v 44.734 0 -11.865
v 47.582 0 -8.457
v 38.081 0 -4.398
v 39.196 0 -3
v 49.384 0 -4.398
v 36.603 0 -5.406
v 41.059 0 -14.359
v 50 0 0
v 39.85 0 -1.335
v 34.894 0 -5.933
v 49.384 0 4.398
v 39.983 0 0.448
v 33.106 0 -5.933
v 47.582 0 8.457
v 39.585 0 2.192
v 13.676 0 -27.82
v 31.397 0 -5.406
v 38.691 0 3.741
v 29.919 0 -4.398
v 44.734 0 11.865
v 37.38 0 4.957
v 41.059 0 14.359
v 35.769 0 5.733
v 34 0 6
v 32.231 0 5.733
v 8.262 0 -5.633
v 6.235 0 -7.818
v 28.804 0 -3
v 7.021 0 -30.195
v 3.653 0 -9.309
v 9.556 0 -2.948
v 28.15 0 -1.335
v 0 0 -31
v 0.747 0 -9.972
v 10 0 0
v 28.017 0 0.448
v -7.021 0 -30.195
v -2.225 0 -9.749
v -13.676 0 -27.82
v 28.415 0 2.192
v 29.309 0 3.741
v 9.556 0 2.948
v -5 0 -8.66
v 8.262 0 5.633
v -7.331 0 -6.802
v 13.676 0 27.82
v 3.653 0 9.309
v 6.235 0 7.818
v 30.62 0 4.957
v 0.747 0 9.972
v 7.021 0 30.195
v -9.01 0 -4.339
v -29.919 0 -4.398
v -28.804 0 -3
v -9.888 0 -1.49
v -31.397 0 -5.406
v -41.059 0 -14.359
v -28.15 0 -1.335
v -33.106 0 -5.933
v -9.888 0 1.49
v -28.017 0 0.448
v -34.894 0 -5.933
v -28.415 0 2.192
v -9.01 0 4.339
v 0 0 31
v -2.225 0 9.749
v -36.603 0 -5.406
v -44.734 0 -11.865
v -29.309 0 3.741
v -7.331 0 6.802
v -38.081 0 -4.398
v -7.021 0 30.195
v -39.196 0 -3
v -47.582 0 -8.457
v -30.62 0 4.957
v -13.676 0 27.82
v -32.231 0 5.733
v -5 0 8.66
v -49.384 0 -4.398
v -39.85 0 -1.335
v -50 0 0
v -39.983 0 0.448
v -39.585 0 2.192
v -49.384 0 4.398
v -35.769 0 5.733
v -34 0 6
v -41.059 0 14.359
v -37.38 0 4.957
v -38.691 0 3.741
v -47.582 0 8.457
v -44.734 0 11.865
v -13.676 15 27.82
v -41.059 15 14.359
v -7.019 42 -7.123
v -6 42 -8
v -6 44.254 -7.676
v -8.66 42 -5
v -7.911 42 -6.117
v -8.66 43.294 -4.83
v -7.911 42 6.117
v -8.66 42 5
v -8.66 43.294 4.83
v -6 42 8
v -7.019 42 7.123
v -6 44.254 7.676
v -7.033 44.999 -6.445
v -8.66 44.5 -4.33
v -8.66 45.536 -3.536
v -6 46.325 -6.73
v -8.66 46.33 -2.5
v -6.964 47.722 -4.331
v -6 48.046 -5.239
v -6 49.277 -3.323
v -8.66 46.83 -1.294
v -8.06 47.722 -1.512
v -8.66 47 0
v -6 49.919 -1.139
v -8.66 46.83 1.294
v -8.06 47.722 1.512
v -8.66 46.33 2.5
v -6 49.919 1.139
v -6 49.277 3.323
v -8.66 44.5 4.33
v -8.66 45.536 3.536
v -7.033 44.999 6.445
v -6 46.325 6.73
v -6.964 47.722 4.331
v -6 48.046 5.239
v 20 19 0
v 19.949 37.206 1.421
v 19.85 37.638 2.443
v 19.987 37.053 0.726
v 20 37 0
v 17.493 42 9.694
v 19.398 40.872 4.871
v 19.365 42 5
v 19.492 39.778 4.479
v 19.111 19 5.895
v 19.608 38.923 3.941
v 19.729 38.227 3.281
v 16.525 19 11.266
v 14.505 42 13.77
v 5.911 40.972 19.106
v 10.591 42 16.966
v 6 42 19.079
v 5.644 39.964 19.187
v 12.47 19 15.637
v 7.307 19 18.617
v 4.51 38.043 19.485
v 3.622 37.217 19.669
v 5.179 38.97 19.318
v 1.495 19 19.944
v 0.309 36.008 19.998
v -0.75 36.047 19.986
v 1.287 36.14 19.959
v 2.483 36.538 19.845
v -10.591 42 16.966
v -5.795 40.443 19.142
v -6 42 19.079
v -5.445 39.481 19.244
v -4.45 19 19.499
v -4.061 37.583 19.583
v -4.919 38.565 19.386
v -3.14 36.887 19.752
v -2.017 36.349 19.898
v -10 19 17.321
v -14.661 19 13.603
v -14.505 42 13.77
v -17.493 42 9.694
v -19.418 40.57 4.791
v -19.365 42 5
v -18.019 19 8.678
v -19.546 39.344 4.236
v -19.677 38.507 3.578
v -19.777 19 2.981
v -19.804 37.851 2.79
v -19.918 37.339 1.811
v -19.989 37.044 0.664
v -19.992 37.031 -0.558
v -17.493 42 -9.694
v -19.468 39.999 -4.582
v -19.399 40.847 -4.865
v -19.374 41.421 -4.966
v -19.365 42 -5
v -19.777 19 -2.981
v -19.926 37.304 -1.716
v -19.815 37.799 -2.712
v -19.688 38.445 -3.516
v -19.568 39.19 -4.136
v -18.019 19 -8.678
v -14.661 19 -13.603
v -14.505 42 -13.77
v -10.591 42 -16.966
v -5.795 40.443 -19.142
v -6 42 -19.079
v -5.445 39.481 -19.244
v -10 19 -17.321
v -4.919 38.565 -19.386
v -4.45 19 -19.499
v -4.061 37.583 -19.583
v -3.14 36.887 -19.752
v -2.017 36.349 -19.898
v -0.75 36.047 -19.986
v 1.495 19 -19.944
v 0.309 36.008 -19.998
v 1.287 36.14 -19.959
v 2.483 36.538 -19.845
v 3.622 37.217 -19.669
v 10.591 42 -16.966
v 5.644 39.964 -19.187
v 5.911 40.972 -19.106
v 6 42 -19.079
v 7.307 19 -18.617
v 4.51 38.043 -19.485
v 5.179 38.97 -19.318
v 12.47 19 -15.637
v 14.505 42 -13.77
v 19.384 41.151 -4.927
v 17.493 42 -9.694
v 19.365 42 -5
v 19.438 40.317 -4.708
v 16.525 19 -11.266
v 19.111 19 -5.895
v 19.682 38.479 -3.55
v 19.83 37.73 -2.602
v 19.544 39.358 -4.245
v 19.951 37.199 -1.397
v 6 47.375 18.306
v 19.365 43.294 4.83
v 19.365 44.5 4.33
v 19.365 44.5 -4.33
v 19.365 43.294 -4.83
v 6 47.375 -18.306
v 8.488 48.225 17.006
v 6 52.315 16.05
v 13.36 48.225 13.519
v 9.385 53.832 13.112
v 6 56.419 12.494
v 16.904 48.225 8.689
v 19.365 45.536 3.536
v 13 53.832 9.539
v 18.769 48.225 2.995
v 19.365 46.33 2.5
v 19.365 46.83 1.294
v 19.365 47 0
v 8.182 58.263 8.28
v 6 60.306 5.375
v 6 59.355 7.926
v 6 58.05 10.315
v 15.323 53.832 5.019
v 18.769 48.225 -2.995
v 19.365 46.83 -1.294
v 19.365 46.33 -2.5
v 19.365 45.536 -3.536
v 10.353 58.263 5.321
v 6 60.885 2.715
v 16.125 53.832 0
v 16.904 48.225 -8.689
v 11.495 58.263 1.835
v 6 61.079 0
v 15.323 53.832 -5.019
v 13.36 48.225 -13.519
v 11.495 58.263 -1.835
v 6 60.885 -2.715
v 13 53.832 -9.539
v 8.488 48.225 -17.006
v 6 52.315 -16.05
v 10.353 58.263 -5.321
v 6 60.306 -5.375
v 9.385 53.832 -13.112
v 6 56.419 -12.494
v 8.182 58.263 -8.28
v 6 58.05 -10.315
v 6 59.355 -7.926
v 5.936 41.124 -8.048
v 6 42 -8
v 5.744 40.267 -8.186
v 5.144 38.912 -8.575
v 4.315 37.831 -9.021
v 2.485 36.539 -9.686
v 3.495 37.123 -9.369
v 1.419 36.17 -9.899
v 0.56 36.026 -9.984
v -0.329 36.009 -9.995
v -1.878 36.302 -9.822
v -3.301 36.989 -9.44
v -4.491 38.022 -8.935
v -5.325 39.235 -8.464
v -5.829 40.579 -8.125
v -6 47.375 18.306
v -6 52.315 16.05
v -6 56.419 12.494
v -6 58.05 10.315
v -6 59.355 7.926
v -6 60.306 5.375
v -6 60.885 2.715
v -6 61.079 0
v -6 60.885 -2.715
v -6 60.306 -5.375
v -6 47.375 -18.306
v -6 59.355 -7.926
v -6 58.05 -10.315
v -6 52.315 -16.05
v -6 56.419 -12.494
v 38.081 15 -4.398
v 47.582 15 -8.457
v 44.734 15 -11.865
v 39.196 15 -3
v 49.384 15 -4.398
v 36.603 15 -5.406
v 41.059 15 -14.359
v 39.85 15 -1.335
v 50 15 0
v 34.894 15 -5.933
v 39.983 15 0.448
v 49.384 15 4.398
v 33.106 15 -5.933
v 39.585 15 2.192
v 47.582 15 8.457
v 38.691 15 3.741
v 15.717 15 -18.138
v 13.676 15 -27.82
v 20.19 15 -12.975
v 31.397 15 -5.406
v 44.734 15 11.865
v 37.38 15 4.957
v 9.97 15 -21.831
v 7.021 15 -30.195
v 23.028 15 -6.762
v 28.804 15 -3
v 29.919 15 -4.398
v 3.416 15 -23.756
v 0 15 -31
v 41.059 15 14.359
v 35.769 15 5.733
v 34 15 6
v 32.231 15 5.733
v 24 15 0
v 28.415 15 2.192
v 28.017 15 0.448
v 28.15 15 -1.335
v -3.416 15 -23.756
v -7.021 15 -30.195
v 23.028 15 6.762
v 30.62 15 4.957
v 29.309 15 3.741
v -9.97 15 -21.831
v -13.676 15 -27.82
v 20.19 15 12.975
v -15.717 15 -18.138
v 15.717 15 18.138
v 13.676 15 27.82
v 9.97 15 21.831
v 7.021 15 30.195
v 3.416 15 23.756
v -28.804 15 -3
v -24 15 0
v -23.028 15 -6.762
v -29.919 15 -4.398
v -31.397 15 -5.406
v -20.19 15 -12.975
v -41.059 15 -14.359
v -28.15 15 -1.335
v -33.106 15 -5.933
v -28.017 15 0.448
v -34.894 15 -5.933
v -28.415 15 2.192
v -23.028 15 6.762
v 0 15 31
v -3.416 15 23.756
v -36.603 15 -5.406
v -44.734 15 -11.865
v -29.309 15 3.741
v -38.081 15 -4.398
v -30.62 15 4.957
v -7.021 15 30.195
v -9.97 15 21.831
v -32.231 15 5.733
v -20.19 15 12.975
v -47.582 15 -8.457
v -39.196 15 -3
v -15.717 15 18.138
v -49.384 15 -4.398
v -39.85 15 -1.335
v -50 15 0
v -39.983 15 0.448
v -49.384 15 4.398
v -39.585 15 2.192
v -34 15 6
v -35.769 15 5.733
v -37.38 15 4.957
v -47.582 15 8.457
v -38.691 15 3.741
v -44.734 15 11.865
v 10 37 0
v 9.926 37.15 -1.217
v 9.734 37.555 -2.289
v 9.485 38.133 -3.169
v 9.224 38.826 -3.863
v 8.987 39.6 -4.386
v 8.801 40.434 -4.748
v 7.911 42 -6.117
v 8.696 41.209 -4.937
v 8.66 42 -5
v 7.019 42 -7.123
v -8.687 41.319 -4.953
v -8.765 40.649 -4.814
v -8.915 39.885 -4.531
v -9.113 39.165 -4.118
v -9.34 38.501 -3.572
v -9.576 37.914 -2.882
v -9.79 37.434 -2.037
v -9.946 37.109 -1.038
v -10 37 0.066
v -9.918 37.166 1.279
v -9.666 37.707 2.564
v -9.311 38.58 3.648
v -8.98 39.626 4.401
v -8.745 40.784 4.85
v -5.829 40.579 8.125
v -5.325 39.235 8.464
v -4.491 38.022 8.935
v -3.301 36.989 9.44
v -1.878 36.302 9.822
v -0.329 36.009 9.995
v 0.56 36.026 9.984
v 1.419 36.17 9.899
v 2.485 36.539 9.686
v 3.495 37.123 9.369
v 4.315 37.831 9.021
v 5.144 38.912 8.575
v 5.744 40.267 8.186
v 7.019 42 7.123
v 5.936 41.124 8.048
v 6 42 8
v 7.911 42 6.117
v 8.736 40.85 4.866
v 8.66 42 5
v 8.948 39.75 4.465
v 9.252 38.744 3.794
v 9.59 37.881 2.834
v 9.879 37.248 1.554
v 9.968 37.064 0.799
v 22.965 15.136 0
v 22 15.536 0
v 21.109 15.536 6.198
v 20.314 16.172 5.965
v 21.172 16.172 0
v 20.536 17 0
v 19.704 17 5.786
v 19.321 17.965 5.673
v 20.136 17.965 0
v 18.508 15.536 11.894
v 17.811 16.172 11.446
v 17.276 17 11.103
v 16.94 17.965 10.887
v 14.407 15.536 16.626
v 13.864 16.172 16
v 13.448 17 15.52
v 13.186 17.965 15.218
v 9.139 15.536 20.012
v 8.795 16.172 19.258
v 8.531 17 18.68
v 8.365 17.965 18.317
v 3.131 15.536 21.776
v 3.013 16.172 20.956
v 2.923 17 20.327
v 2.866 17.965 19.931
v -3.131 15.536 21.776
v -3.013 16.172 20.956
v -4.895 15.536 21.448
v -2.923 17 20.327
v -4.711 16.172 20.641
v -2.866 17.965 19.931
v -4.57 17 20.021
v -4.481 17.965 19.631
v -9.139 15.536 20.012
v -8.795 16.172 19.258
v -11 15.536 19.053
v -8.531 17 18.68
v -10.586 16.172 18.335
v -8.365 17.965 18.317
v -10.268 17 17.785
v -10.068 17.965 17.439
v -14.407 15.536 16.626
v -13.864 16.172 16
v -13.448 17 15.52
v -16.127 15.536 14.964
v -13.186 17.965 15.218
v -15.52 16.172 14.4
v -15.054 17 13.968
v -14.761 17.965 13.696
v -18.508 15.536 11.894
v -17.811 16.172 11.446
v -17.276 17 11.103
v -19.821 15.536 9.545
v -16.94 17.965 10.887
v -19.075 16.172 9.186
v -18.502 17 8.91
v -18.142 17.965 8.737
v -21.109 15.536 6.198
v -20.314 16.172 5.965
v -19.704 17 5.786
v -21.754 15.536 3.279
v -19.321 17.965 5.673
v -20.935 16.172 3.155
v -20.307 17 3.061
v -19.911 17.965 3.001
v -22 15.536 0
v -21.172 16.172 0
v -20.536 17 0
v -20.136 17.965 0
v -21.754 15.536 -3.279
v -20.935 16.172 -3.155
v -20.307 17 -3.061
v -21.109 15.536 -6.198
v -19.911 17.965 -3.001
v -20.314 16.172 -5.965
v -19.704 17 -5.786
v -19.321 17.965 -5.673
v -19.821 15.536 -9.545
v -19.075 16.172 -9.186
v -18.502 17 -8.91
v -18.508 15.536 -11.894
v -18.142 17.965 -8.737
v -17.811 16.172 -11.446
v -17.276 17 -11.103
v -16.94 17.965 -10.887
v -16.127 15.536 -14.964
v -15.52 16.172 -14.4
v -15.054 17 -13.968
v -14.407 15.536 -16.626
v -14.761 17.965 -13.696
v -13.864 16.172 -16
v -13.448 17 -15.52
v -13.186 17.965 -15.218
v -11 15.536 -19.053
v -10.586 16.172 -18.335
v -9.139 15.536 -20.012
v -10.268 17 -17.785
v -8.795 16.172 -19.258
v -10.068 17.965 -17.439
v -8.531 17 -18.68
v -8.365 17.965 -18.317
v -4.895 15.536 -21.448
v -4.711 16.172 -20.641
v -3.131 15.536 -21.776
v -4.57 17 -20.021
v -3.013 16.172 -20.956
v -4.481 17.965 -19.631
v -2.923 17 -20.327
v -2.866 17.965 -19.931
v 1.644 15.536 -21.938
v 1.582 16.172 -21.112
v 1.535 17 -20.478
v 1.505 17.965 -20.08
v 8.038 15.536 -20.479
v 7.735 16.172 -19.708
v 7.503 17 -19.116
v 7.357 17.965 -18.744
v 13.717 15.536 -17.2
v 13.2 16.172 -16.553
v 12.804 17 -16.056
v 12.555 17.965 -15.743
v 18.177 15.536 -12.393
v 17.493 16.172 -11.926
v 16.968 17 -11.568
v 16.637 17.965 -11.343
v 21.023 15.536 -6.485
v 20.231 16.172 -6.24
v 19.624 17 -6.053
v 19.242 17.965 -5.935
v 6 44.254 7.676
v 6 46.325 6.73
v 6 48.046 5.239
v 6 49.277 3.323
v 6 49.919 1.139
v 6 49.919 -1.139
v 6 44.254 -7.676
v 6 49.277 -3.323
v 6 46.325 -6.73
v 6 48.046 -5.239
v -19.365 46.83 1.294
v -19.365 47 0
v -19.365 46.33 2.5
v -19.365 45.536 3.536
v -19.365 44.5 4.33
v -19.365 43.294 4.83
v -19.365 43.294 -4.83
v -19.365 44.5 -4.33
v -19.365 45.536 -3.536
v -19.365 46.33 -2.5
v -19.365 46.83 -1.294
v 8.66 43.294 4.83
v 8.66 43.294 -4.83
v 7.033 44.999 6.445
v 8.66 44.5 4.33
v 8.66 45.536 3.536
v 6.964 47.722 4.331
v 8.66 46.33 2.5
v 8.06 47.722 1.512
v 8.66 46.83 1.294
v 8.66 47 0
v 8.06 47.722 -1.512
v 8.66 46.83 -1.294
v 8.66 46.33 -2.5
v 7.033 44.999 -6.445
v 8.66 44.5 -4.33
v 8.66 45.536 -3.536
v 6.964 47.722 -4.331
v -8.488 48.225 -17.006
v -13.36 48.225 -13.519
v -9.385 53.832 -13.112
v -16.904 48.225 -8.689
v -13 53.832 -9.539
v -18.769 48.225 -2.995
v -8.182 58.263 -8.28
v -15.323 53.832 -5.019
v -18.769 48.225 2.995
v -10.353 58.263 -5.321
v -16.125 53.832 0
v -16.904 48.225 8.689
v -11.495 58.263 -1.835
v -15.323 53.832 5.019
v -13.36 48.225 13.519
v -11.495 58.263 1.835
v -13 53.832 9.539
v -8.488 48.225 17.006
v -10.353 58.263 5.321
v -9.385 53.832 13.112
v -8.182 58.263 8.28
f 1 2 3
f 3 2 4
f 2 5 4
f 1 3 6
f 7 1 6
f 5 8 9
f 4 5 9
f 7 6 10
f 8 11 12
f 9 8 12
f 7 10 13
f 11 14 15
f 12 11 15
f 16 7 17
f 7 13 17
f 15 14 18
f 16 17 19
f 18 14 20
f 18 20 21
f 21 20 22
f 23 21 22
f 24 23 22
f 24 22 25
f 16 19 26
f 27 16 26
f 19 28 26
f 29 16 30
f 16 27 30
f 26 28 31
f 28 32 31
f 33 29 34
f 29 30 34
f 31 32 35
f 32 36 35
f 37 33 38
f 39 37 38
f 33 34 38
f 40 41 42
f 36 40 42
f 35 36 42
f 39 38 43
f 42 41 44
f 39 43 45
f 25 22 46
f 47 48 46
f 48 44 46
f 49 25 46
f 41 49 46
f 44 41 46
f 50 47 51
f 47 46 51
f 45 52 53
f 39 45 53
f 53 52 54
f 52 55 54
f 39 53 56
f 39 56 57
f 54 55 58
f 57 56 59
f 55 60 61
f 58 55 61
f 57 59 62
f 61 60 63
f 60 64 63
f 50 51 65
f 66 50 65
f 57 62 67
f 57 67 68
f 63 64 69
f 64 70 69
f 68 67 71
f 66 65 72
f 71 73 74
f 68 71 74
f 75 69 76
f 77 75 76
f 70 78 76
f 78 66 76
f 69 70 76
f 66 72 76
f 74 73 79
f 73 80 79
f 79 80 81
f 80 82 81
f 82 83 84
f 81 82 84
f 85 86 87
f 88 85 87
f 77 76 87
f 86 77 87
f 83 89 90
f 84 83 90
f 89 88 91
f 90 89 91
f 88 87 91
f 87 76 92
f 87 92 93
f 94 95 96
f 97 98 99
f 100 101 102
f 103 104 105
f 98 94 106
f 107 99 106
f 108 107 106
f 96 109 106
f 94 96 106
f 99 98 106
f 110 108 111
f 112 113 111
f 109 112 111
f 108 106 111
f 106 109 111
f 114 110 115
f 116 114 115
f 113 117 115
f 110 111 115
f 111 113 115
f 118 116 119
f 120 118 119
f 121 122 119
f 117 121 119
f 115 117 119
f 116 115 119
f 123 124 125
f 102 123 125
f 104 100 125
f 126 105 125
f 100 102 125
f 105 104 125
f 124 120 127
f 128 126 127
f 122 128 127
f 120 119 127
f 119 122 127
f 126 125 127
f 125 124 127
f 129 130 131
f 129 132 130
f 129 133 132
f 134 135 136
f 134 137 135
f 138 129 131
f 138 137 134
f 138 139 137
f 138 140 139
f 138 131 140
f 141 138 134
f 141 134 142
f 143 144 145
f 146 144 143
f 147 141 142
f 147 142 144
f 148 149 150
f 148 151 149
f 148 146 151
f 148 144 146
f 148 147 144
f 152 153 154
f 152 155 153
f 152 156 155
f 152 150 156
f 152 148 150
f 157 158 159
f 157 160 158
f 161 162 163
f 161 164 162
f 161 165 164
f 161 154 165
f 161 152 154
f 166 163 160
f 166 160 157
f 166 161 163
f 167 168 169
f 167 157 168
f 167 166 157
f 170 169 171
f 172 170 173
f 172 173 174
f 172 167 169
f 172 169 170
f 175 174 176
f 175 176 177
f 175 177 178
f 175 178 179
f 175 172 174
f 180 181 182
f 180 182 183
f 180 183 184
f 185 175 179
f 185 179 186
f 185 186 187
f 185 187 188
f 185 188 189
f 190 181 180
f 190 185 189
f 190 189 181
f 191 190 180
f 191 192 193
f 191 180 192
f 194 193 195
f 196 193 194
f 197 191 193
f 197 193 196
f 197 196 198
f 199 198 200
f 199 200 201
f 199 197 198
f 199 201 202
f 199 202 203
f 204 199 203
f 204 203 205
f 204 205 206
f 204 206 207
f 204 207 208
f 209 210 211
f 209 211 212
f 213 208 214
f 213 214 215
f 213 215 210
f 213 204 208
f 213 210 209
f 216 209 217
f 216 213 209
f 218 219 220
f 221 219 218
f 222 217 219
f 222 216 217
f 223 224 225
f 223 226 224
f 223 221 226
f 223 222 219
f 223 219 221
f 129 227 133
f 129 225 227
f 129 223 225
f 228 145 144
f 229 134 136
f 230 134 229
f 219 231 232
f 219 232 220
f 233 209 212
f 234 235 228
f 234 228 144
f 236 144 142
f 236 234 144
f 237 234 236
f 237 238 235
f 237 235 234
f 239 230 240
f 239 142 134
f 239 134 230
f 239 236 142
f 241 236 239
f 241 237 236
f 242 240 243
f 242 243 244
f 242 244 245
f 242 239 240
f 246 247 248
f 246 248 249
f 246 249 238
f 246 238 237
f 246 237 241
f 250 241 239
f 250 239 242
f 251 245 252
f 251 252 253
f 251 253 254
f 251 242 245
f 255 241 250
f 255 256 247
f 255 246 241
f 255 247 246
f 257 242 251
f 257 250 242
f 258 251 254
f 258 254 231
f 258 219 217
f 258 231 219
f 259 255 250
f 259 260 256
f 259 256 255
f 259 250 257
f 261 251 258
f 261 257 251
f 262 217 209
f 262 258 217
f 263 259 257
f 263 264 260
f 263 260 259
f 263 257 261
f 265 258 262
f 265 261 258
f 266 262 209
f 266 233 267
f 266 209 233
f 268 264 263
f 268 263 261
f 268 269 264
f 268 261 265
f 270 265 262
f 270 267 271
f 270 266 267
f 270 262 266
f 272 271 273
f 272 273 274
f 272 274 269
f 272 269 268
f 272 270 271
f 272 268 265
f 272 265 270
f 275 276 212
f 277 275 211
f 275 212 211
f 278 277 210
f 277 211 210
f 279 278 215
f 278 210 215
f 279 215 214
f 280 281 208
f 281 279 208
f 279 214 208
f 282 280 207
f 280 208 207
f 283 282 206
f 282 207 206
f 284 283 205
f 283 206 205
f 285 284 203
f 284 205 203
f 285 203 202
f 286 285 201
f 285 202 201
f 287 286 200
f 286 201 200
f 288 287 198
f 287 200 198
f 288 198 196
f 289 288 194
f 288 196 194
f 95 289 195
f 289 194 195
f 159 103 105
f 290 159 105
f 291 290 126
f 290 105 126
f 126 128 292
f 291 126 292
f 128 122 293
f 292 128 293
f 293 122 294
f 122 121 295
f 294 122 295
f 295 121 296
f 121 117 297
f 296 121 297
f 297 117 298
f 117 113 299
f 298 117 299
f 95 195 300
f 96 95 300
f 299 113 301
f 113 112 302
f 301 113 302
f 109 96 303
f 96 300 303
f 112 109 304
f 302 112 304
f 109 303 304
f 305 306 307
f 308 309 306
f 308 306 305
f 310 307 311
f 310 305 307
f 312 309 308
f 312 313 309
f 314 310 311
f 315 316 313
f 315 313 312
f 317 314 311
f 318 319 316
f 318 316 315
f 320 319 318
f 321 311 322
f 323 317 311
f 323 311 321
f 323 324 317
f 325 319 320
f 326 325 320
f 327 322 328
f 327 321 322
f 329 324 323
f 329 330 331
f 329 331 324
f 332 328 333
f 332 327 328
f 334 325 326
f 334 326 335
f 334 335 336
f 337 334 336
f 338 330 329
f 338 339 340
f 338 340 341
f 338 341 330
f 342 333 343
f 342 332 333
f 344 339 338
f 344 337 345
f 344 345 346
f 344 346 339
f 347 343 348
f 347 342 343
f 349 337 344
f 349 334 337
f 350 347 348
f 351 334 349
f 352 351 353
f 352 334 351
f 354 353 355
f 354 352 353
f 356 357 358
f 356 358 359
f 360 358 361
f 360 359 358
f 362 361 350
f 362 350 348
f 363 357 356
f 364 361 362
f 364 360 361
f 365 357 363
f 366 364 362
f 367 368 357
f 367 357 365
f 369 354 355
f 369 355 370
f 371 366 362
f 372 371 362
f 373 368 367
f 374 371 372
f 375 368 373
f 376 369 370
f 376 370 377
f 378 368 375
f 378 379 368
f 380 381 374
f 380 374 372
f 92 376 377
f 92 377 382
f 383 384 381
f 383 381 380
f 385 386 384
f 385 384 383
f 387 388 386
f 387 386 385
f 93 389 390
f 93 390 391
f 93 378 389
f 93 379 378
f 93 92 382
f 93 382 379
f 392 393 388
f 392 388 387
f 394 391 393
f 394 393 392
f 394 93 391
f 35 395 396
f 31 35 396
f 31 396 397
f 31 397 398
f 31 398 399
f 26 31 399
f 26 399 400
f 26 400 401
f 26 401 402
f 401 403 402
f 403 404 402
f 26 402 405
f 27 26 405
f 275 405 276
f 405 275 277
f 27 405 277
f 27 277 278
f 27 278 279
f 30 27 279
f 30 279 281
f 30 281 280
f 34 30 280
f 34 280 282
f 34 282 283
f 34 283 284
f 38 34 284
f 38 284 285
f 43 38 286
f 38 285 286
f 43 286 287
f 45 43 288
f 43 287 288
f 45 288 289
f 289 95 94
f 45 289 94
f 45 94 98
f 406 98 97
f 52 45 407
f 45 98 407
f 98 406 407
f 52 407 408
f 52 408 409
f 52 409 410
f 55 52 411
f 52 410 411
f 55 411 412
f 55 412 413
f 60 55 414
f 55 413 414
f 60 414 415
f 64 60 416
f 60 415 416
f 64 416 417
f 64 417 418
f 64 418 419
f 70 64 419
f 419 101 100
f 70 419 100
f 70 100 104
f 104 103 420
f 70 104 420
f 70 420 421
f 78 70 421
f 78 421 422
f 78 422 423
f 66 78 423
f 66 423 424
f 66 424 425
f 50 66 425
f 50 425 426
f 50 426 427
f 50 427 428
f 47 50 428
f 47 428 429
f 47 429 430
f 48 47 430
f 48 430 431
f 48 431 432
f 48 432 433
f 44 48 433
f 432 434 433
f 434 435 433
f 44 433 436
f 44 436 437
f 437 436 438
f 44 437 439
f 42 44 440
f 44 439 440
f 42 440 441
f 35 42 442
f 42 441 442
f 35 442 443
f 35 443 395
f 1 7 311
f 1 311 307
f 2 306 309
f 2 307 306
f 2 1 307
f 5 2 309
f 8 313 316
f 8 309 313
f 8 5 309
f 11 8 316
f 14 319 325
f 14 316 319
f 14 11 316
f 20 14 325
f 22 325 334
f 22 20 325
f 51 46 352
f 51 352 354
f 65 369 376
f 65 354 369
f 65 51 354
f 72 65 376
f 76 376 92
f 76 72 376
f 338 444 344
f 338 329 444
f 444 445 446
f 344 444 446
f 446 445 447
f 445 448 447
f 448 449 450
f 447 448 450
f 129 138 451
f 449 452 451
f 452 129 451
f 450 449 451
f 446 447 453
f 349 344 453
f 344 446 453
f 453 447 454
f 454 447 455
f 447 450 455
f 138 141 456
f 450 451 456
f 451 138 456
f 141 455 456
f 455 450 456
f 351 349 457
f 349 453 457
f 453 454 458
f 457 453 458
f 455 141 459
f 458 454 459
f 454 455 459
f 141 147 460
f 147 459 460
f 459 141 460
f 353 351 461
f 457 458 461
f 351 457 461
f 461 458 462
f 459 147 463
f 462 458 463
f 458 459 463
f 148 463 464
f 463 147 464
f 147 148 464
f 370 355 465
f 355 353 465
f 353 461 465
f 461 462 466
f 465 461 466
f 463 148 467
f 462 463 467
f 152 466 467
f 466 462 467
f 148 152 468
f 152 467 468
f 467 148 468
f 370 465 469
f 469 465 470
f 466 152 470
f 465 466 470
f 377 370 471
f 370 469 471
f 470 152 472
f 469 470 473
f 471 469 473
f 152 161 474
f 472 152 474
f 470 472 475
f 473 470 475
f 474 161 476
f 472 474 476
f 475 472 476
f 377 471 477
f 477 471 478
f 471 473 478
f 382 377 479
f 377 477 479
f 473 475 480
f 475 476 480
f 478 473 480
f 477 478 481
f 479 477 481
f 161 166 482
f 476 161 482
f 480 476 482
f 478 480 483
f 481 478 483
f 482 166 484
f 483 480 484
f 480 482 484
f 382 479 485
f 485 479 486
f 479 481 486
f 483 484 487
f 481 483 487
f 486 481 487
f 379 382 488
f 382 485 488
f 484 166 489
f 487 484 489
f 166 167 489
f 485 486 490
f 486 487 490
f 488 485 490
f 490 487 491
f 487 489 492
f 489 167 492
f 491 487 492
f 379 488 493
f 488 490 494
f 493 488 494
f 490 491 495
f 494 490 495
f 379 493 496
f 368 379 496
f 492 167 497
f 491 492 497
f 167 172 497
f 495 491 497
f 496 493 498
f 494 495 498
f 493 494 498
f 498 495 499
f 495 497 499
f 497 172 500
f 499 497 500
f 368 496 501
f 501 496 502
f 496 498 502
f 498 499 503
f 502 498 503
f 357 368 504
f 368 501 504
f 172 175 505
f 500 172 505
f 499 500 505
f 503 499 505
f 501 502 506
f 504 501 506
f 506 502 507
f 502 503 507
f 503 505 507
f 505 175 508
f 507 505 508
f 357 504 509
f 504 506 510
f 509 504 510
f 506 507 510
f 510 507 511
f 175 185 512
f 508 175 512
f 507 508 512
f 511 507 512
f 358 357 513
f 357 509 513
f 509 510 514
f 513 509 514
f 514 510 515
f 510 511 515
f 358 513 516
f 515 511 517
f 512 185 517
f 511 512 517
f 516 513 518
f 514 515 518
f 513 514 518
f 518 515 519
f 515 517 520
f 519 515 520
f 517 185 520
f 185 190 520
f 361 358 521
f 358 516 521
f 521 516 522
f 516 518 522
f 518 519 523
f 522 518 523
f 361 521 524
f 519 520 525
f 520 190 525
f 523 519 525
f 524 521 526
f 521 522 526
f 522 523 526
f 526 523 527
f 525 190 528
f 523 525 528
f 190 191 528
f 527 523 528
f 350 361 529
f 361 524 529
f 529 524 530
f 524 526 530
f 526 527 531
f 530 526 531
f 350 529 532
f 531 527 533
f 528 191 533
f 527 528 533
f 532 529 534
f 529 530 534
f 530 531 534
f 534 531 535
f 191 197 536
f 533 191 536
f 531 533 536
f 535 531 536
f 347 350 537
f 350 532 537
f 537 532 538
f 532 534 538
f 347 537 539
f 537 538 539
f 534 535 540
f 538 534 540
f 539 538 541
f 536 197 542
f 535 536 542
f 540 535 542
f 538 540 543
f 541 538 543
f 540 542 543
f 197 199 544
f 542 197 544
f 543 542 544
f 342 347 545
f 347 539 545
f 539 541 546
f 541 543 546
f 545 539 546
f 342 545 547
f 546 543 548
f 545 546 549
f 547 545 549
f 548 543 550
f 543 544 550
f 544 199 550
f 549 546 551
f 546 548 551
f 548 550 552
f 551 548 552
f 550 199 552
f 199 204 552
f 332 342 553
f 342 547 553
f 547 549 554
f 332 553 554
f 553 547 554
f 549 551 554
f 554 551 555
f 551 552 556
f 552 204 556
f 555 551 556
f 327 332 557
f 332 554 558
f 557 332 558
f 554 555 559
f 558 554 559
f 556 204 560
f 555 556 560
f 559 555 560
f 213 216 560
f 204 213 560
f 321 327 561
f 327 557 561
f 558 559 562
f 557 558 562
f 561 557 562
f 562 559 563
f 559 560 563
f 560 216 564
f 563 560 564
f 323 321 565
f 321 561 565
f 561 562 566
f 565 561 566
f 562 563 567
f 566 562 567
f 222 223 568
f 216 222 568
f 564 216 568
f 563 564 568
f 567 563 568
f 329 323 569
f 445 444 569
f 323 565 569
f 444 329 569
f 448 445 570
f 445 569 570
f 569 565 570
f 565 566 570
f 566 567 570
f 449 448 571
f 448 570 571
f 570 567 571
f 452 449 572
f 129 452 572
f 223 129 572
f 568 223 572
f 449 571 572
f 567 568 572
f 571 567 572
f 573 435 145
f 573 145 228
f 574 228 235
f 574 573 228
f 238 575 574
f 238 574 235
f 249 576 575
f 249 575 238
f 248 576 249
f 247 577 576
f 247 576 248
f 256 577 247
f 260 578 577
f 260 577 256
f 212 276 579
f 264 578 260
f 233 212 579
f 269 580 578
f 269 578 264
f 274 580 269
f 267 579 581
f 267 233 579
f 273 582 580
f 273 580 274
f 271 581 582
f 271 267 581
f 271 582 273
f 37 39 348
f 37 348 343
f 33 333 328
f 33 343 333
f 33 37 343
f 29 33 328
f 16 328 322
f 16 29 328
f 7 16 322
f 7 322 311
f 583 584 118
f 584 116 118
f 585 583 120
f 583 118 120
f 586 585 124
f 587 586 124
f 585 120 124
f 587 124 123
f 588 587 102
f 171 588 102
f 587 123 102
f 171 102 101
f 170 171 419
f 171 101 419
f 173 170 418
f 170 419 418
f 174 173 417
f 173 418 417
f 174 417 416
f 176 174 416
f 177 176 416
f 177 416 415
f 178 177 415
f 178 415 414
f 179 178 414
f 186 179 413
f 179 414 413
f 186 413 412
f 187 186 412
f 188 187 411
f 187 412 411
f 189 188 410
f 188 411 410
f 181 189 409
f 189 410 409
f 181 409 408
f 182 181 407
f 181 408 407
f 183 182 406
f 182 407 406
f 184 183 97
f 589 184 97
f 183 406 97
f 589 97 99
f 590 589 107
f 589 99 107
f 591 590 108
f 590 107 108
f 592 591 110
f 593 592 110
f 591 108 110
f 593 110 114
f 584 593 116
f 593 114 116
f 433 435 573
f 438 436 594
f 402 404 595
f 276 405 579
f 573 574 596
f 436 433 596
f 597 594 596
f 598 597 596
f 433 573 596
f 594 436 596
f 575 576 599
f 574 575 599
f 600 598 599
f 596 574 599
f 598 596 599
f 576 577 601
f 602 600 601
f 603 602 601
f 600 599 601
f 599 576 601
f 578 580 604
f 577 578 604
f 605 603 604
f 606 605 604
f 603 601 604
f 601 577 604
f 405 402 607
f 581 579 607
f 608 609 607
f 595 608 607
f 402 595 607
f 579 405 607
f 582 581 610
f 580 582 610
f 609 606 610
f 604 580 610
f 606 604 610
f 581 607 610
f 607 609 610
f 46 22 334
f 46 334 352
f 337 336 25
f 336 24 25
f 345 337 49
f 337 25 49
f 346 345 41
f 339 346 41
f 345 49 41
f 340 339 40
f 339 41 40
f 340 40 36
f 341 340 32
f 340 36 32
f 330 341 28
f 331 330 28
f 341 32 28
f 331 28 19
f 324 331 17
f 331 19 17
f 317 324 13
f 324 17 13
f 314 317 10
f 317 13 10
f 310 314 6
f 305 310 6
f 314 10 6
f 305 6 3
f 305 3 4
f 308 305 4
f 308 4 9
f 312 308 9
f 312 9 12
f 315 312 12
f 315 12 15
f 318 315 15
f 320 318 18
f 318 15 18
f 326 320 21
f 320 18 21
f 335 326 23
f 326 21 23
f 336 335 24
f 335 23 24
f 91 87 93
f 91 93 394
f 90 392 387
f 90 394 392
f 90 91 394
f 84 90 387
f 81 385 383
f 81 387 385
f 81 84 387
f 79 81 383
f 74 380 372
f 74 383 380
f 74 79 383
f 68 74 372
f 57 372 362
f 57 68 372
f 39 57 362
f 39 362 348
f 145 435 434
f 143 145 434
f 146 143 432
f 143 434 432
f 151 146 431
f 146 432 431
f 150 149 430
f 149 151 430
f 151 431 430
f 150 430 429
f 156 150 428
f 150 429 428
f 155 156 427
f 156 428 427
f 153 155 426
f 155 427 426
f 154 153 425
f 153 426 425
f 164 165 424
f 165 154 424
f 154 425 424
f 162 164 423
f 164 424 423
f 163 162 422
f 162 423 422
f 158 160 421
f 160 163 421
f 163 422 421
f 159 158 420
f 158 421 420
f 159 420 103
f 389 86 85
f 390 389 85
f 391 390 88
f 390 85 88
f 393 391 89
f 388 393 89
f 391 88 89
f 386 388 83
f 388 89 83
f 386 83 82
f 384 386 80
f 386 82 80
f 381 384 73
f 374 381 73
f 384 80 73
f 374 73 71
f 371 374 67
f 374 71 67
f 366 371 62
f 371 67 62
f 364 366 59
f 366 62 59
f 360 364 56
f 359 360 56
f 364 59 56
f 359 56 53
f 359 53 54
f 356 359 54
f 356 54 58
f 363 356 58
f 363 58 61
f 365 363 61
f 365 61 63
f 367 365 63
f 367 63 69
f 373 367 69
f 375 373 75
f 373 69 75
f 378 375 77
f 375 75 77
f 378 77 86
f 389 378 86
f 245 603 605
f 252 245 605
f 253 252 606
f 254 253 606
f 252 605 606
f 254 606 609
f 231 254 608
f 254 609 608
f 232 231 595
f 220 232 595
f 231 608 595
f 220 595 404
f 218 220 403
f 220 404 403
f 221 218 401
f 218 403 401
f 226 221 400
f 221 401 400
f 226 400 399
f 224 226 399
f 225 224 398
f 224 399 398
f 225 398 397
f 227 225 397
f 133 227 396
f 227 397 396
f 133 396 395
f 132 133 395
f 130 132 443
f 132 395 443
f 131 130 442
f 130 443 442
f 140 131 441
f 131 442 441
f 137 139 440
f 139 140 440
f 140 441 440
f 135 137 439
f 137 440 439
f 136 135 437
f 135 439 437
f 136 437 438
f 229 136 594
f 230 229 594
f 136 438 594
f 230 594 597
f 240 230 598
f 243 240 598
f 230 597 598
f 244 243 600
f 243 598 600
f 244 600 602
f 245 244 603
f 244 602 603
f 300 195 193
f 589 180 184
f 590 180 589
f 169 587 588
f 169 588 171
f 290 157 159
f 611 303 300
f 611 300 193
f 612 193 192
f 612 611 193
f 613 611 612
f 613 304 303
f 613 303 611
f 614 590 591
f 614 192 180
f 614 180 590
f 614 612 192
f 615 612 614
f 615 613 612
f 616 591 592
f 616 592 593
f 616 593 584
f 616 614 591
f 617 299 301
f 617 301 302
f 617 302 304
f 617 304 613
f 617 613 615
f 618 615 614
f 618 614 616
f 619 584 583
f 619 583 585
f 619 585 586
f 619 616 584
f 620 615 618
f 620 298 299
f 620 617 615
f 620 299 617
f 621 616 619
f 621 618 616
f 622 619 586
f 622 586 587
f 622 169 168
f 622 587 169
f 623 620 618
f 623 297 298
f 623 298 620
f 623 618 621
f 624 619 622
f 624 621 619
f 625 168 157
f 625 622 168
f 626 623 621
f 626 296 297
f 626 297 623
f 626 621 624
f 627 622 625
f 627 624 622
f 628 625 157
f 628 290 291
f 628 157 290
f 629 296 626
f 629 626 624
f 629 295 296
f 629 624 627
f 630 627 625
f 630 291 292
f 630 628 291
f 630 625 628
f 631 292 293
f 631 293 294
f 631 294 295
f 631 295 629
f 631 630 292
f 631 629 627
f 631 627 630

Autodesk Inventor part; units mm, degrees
ref_plane "YZ Plane" through (0, 0, 0) normal (1, 0, 0) x (0, 1, 0)
ref_plane "XZ Plane" through (0, 0, 0) normal (0, 1, 0) x (-1, 0, 0)
ref_plane "XY Plane" through (0, 0, 0) normal (0, 0, 1) x (1, 0, 0)
sketch "Sketch1" plane through (0, 0, 0) normal (0, 1, 0) x (-1, 0, 0)
  line L0 (41.0588, -14.3587) -> (13.6765, -27.82)
  arc A0 (-13.6765, -27.82) -> (13.6765, -27.82) centre (0, 0) ccw
  line L1 (-13.6765, -27.82) -> (-41.0588, -14.3587)
  arc A1 (-41.0588, 14.3587) -> (-41.0588, -14.3587) centre (-34, 0) ccw
  line L2 (-41.0588, 14.3587) -> (-13.6765, 27.82)
  arc A2 (13.6765, 27.82) -> (-13.6765, 27.82) centre (0, 0) ccw
  line L3 (13.6765, 27.82) -> (41.0588, 14.3587)
  arc A3 (41.0588, -14.3587) -> (41.0588, 14.3587) centre (34, 0) ccw
  dimension "d0" = 68
  dimension "d1" = 16
  dimension "d2" = 31
extrude "Extrusion1" add sketch "Sketch1" along normal blind 15
sketch "Sketch2" plane through (0, 15, 0) normal (0, 1, 0) x (1, 0, 0)
  arc A0 (-13.6765, -27.82) -> (13.6765, -27.82) centre (0, 0) ccw projected
  circle A1 centre (0, 0) radius 20
  dimension "d5" = 40
extrude "Extrusion2" add sketch "Sketch2" along normal blind 27
fillet "Fillet1" radius 4 1 edges at (-20, 15, 0)
sketch "Sketch3" plane through (0, 0, 0) normal (0, 0, 1) x (1, 0, 0)
  line L0 (20, 42) -> (-20, 42) projected
  arc A0 (20, 42) -> (0, 62) centre (0, 42) ccw
  line L1 (0, -13.2284) -> (0, 79.3706) projected
  point P0 (0, 0)
  point P1 (0, 42)
revolve "Revolution1" add sketch "Sketch3" angle 360 about axis through (0, -10, 0) along (0, 1, 0)
sketch "Sketch4" plane through (0, 0, 0) normal (0, 0, 1) x (1, 0, 0)
  arc A0 (20, 42) -> (-20, 42) centre (0, 42) ccw projected
  arc A1 (20, 42) -> (-20, 42) centre (0, 42) ccw projected
  line L0 (10, 0) -> (10, 42)
  arc A2 (10, 42) -> (0, 52) centre (0, 42) ccw
  line L1 (0, -12.4) -> (0, 74.4) projected
  line L2 (10, 0) -> (0, 0)
  dimension "d10" = 20
revolve "Revolution2" cut sketch "Sketch4" angle 360 about axis through (0, -10, 0) along (0, 1, 0)
sketch "Sketch5" plane through (0, 0, 0) normal (0, 0, 1) x (1, 0, 0)
  arc A0 (10, 42) -> (-10, 42) centre (0, 42) ccw projected
  arc A1 (-6, 42) -> (6, 42) centre (0, 42) ccw
  line L0 (-6, 42) -> (-6, 61.0788)
  line L1 (6, 42) -> (6, 61.0788)
  line L2 (20, 42) -> (-20, 42) projected
  arc A2 (20, 42) -> (-20, 42) centre (0, 42) ccw projected
  arc A3 (6, 61.0788) -> (-6, 61.0788) centre (0, 42) ccw
  point P0 (0, 0)
  dimension "d12" = 6
extrude "Extrusion3" cut sketch "Sketch5" along normal through all both and the other way through all contours L1 L2 L0 A0 | A0 L0 A2 L1 | A1 L2
sketch "Sketch6" plane through (0, 0, 0) normal (1, 0, 0) x (0, 1, 0)
  arc A0 (42, -8) -> (42, 8) centre (42, 0) ccw projected
  circle A1 centre (42, 0) radius 5
  point P0 (0, 0)
  dimension "d15" = 10
extrude "Extrusion4" cut sketch "Sketch6" along normal through all both and the other way through all
sketch "Sketch7" plane through (0, 15, 0) normal (0, 1, 0) x (1, 0, 0)
  arc A0 (41.0588, -14.3587) -> (41.0588, 14.3587) centre (34, 0) ccw projected
  arc A1 (-41.0588, 14.3587) -> (-41.0588, -14.3587) centre (-34, 0) ccw projected
hole "Hole1" at (-34, 15, 0) at (34, 15, 0) direction (0, -1, 0) diameter 12 end through all
properties part number "Part010TiltSupport" material "Steel, Cast"
